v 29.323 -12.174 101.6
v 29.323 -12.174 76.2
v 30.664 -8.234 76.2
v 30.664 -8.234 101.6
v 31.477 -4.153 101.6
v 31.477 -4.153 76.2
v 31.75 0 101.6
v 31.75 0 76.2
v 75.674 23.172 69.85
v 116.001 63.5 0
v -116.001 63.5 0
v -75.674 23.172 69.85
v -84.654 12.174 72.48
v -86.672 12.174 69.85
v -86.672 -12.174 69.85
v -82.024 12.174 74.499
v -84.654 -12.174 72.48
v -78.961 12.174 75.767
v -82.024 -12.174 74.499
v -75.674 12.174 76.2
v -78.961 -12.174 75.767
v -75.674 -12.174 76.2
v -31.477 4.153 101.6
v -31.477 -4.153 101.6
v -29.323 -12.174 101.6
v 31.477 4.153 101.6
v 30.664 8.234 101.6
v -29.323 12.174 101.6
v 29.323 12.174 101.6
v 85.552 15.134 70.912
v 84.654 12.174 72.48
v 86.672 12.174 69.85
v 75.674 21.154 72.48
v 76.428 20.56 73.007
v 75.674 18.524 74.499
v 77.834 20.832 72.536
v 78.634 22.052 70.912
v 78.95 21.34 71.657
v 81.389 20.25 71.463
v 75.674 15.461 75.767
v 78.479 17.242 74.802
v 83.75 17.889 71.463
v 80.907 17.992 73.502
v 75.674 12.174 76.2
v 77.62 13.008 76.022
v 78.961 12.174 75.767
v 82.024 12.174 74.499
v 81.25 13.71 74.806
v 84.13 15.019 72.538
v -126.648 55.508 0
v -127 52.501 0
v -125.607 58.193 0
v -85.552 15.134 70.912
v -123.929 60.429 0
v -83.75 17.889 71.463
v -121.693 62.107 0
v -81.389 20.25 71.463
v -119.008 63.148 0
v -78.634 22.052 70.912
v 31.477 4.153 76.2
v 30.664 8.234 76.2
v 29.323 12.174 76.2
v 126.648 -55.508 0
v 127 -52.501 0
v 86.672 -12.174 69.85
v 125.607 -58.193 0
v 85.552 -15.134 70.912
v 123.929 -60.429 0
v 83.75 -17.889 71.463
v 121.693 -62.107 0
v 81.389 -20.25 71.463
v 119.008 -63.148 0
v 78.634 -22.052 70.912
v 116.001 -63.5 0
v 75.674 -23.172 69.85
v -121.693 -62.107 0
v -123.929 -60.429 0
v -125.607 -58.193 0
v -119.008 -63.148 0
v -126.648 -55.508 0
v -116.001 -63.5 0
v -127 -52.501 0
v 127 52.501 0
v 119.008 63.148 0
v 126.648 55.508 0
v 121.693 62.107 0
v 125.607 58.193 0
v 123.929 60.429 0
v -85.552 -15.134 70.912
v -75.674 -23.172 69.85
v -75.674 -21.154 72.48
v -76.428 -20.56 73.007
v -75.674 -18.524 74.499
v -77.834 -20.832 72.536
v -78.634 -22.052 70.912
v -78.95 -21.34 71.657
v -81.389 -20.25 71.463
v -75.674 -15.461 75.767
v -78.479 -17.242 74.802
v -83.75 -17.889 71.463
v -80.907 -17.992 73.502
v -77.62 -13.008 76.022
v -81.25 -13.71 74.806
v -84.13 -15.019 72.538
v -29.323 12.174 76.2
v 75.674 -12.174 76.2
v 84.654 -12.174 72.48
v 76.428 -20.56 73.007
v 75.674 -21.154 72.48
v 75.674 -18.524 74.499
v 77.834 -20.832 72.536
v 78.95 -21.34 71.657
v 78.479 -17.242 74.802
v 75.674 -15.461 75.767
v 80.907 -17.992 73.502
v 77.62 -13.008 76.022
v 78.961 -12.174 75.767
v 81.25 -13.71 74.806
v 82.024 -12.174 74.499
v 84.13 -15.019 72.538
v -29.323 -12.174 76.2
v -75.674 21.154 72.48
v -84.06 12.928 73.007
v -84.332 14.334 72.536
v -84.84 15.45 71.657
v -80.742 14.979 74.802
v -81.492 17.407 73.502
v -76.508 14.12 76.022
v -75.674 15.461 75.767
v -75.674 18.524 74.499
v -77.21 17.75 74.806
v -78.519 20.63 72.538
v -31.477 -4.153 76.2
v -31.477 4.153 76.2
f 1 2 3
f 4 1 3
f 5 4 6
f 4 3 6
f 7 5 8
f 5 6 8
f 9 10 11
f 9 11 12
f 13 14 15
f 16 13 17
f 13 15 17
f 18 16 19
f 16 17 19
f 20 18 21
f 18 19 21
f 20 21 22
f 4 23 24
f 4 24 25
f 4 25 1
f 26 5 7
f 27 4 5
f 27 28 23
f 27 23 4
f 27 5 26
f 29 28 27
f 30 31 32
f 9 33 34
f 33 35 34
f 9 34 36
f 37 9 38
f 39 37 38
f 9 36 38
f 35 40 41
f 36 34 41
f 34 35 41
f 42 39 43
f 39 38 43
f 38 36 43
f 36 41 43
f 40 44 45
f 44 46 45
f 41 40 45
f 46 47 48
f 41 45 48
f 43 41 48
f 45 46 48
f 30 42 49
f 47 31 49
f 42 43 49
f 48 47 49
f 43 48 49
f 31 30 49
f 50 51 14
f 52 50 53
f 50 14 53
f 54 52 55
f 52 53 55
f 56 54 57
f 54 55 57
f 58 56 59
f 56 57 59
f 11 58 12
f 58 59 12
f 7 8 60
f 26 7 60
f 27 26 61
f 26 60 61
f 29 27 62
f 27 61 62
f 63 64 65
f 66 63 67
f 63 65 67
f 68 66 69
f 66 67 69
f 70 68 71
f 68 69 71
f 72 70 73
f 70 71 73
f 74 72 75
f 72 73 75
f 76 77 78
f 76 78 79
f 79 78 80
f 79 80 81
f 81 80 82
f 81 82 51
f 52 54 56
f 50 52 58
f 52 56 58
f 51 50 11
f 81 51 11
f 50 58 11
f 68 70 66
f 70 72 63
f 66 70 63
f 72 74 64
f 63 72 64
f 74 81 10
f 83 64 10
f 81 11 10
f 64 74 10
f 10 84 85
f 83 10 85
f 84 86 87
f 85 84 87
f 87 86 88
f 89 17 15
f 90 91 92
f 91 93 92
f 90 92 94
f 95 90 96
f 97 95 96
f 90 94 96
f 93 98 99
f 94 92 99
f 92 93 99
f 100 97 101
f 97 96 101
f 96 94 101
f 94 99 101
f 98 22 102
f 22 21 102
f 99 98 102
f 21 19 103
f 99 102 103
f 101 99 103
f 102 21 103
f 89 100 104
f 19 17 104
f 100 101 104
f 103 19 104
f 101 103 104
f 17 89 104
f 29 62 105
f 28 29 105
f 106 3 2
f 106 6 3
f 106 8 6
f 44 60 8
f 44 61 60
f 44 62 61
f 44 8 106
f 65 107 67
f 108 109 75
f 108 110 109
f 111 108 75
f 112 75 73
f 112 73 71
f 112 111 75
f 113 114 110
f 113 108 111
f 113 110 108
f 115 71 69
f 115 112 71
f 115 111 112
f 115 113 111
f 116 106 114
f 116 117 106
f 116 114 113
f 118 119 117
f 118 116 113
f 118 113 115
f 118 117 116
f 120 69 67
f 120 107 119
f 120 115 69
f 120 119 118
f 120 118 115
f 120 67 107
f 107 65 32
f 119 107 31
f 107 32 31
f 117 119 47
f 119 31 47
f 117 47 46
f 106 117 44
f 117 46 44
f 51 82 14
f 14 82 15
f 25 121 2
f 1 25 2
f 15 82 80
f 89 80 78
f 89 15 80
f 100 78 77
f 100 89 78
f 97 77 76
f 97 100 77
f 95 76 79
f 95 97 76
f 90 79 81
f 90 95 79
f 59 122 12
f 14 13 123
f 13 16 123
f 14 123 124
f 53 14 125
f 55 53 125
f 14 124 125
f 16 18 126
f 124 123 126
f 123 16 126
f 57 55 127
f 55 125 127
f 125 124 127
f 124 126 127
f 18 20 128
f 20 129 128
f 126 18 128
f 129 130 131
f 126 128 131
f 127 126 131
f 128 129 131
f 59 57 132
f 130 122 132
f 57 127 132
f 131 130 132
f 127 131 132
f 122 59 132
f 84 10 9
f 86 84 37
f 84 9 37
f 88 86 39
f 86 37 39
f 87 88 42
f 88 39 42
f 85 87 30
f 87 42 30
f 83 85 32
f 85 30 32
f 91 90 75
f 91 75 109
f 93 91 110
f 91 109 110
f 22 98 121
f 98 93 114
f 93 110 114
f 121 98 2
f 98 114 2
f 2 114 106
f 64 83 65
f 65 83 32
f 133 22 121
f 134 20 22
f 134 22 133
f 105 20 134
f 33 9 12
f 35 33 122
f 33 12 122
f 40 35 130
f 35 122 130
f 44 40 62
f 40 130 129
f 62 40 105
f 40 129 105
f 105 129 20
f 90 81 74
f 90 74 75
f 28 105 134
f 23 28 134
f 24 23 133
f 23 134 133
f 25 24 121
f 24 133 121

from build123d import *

# Parameters (mm, degrees)
F0_W     = 254
F0_H     = 127
F1_DEPTH = 76.2
F1_TAPER = 30
F2_R     = 12.7
F4_DEPTH = 25.4


with BuildPart() as f1:
    # F0 (on Top) → F1 (new body)
    with BuildSketch(Plane.XY):
        Rectangle(F0_W, F0_H)
    extrude(amount=F1_DEPTH, taper=F1_TAPER)

    # F2
    f2_edges = [f1.edges().sort_by_distance(p)[0] for p in [
        (83.005909, 0, 76.2),
        (0, 19.505909, 76.2),
        (-83.005909, 0, 76.2),
        (0, -19.505909, 76.2),
        (105.002955, 41.502955, 38.1),
        (105.002955, -41.502955, 38.1),
        (-105.002955, -41.502955, 38.1),
        (-105.002955, 41.502955, 38.1),
    ]]
    fillet(f2_edges, radius=F2_R)

    # F3 (on face) → F4 (join)
    with BuildSketch(Plane.XY.offset(76.2)):
        with BuildLine():
            ThreePointArc((29.3234873591, -12.173561069), (31.1374631565, -6.2065198118), (31.75, 0))
            ThreePointArc((31.75, 0), (31.1374631565, 6.2065198118), (29.3234873591, 12.173561069))
            Line((29.3234873591, 12.173561069), (-29.3234873591, 12.173561069))
            ThreePointArc((-29.3234873591, 12.173561069), (-31.75, 0), (-29.3234873591, -12.173561069))
            Line((-29.3234873591, -12.173561069), (29.3234873591, -12.173561069))
        make_face()
    extrude(amount=F4_DEPTH)


solid = f1.part
